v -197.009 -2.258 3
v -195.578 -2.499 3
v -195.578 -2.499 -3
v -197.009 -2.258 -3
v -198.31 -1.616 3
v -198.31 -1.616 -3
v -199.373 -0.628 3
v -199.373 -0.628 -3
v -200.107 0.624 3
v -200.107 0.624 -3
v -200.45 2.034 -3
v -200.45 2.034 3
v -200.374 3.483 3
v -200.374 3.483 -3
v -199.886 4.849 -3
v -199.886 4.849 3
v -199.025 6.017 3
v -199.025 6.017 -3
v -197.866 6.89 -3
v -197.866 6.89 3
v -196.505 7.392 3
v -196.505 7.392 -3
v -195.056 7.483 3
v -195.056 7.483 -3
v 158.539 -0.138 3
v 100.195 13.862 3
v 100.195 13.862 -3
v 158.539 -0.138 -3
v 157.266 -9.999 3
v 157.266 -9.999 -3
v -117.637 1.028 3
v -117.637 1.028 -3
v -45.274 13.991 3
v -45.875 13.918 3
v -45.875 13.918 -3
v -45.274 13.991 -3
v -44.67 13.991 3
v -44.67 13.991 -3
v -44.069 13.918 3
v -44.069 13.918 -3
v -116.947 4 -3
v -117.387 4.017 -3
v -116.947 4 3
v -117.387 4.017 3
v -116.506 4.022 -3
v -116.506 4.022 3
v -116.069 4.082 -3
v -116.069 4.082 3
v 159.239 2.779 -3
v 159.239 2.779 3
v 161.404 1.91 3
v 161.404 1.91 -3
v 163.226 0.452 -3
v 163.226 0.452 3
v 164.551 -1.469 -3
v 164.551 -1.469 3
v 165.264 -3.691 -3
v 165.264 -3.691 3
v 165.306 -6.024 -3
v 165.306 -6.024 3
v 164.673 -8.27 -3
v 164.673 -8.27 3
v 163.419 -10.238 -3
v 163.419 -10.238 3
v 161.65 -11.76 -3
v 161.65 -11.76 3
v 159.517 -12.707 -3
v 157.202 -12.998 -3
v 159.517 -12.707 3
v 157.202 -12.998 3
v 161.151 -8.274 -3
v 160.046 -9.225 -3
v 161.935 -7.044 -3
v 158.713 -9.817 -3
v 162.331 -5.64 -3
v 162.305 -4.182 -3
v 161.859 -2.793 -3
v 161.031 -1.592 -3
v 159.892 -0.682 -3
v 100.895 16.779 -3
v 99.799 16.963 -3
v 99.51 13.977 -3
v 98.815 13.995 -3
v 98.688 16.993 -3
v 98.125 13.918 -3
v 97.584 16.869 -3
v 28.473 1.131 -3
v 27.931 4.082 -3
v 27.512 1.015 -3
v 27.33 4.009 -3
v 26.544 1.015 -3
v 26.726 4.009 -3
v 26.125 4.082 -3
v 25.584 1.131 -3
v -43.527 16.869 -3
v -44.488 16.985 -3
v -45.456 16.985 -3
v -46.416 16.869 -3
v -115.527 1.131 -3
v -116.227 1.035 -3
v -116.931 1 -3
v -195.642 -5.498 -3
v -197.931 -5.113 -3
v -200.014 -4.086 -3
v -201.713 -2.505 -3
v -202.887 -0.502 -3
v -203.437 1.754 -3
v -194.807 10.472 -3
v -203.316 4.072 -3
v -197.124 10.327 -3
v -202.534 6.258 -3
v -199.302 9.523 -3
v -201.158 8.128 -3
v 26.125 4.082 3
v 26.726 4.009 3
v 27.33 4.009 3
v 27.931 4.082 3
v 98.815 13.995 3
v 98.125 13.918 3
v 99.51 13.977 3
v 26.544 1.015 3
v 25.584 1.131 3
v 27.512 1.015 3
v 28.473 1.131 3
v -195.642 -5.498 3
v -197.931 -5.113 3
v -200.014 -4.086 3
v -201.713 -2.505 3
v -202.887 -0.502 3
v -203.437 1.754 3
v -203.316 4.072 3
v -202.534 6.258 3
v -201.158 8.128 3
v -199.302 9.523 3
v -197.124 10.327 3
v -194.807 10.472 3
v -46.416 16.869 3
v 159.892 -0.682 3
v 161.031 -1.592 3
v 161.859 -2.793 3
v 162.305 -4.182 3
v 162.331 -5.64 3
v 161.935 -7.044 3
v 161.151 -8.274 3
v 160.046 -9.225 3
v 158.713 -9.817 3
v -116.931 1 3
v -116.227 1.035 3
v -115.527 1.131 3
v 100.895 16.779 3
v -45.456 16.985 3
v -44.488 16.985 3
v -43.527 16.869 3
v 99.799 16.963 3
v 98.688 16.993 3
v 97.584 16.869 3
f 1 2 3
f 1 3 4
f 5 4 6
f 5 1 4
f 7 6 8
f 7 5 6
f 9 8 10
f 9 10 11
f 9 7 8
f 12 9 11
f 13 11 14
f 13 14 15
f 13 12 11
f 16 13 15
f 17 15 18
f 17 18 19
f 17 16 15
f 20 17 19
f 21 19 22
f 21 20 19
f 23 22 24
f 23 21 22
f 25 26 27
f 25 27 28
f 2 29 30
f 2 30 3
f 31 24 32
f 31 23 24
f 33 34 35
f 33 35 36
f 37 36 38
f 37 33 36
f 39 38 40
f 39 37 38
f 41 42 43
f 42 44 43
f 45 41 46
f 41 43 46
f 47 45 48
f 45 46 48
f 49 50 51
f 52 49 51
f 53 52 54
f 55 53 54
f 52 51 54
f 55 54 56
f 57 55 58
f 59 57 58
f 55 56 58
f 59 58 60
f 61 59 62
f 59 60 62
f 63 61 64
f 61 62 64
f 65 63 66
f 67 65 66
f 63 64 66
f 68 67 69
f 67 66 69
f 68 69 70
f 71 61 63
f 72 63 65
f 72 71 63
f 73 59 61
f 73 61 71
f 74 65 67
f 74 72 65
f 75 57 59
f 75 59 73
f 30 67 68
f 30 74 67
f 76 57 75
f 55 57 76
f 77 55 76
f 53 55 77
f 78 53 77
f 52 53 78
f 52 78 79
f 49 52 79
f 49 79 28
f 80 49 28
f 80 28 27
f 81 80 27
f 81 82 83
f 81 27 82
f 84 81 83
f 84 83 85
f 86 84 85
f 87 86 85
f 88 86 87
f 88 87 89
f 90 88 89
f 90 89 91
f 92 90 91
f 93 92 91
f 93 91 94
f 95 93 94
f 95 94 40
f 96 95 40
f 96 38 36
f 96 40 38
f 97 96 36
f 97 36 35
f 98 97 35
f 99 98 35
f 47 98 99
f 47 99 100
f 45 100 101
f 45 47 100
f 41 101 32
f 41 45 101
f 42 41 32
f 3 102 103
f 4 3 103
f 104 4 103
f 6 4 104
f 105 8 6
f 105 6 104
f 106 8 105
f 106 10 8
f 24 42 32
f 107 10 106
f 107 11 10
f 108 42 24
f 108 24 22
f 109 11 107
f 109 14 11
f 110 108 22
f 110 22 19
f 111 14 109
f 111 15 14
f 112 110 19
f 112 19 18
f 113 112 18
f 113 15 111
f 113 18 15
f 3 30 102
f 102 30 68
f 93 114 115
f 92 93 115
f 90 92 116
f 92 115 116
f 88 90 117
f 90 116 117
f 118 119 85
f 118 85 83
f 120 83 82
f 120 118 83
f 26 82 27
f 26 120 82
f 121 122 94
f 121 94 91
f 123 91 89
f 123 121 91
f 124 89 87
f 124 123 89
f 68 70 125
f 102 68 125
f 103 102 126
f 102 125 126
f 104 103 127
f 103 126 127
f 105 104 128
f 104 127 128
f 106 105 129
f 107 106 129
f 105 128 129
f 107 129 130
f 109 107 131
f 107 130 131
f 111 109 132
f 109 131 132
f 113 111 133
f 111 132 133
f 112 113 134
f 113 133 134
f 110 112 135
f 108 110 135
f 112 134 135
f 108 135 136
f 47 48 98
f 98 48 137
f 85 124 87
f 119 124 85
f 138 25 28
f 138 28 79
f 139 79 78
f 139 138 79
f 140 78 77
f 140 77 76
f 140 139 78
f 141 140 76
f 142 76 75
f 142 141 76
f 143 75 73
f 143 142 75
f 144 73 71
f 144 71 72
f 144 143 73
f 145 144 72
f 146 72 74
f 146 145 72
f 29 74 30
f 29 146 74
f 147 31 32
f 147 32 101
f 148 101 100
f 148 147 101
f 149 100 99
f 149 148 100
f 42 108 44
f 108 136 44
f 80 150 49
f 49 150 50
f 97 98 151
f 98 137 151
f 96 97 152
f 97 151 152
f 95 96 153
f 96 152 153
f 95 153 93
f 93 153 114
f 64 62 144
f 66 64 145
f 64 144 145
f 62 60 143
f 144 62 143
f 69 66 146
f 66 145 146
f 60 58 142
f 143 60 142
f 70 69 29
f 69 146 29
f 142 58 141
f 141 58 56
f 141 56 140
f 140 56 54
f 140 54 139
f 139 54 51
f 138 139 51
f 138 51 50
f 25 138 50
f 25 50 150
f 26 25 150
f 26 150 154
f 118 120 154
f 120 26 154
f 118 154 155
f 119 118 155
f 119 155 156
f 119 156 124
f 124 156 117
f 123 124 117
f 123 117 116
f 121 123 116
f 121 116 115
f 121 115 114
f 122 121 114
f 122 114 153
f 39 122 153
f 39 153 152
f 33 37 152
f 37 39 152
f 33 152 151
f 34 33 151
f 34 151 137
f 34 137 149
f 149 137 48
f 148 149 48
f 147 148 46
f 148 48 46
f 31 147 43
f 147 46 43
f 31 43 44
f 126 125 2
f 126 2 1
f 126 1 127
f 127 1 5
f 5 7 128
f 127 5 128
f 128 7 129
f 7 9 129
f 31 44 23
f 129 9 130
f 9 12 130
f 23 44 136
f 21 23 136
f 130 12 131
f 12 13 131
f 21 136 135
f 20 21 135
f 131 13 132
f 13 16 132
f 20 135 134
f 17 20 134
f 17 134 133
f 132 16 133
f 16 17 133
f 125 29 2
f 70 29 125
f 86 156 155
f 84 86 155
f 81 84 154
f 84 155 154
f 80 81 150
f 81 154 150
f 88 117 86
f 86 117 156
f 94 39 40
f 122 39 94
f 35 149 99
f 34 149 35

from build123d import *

# Parameters (mm, degrees)
BOSS_EXTRUDE1_DEPTH = 3


with BuildPart() as part:
    # Sketch1 → Boss-Extrude1 (new, symmetric)
    with BuildSketch(Plane.XY):
        with BuildLine():
            Line((157.201895781, -12.998193365), (-195.641912802, -5.498193365))
            ThreePointArc((-195.641912802, -5.498193365), (-203.460999592, 2.917559906), (-194.807193354, 10.472337133))
            Line((-194.807193354, 10.472337133), (-117.387348628, 4.017289292))
            ThreePointArc((-117.387348628, 4.017289292), (-116.726087197, 4.00604626), (-116.069126514, 4.082176062))
            Line((-116.069126514, 4.082176062), (-46.416348736, 16.868518301))
            ThreePointArc((-46.416348736, 16.868518301), (-44.971904292, 17), (-43.527459847, 16.868518301))
            Line((-43.527459847, 16.868518301), (26.125317931, 4.082176062))
            ThreePointArc((26.125317931, 4.082176062), (27.028095708, 4), (27.930873486, 4.082176062))
            Line((27.930873486, 4.082176062), (97.583651264, 16.868518301))
            ThreePointArc((97.583651264, 16.868518301), (99.243881438, 16.997089253), (100.894762375, 16.779174478))
            Line((100.894762375, 16.779174478), (159.238570958, 2.779174478))
            ThreePointArc((159.238570958, 2.779174478), (165.306070677, -6.024208847), (157.201895781, -12.998193365))
        make_face()
        with BuildLine():
            Line((-195.056459955, 7.482710708), (-117.63661523, 1.027662867))
            ThreePointArc((-117.63661523, 1.027662867), (-116.57859694, 1.009674016), (-115.527459847, 1.131481699))
            Line((-115.527459847, 1.131481699), (-45.874682069, 13.917823938))
            ThreePointArc((-45.874682069, 13.917823938), (-44.971904292, 14), (-44.069126514, 13.917823938))
            Line((-44.069126514, 13.917823938), (25.583651264, 1.131481699))
            ThreePointArc((25.583651264, 1.131481699), (27.028095708, 1), (28.472540153, 1.131481699))
            Line((28.472540153, 1.131481699), (98.125317931, 13.917823938))
            ThreePointArc((98.125317931, 13.917823938), (99.162961789, 13.998180783), (100.194762375, 13.861984049))
            Line((100.194762375, 13.861984049), (158.538570958, -0.138015951))
            ThreePointArc((158.538570958, -0.138015951), (162.330758283, -5.640130529), (157.265648973, -9.998870853))
            Line((157.265648973, -9.998870853), (-195.578159611, -2.498870853))
            ThreePointArc((-195.578159611, -2.498870853), (-200.465088855, 2.760974942), (-195.056459955, 7.482710708))
        make_face(mode=Mode.SUBTRACT)
    extrude(amount=BOSS_EXTRUDE1_DEPTH, both=True)


solid = part.part
